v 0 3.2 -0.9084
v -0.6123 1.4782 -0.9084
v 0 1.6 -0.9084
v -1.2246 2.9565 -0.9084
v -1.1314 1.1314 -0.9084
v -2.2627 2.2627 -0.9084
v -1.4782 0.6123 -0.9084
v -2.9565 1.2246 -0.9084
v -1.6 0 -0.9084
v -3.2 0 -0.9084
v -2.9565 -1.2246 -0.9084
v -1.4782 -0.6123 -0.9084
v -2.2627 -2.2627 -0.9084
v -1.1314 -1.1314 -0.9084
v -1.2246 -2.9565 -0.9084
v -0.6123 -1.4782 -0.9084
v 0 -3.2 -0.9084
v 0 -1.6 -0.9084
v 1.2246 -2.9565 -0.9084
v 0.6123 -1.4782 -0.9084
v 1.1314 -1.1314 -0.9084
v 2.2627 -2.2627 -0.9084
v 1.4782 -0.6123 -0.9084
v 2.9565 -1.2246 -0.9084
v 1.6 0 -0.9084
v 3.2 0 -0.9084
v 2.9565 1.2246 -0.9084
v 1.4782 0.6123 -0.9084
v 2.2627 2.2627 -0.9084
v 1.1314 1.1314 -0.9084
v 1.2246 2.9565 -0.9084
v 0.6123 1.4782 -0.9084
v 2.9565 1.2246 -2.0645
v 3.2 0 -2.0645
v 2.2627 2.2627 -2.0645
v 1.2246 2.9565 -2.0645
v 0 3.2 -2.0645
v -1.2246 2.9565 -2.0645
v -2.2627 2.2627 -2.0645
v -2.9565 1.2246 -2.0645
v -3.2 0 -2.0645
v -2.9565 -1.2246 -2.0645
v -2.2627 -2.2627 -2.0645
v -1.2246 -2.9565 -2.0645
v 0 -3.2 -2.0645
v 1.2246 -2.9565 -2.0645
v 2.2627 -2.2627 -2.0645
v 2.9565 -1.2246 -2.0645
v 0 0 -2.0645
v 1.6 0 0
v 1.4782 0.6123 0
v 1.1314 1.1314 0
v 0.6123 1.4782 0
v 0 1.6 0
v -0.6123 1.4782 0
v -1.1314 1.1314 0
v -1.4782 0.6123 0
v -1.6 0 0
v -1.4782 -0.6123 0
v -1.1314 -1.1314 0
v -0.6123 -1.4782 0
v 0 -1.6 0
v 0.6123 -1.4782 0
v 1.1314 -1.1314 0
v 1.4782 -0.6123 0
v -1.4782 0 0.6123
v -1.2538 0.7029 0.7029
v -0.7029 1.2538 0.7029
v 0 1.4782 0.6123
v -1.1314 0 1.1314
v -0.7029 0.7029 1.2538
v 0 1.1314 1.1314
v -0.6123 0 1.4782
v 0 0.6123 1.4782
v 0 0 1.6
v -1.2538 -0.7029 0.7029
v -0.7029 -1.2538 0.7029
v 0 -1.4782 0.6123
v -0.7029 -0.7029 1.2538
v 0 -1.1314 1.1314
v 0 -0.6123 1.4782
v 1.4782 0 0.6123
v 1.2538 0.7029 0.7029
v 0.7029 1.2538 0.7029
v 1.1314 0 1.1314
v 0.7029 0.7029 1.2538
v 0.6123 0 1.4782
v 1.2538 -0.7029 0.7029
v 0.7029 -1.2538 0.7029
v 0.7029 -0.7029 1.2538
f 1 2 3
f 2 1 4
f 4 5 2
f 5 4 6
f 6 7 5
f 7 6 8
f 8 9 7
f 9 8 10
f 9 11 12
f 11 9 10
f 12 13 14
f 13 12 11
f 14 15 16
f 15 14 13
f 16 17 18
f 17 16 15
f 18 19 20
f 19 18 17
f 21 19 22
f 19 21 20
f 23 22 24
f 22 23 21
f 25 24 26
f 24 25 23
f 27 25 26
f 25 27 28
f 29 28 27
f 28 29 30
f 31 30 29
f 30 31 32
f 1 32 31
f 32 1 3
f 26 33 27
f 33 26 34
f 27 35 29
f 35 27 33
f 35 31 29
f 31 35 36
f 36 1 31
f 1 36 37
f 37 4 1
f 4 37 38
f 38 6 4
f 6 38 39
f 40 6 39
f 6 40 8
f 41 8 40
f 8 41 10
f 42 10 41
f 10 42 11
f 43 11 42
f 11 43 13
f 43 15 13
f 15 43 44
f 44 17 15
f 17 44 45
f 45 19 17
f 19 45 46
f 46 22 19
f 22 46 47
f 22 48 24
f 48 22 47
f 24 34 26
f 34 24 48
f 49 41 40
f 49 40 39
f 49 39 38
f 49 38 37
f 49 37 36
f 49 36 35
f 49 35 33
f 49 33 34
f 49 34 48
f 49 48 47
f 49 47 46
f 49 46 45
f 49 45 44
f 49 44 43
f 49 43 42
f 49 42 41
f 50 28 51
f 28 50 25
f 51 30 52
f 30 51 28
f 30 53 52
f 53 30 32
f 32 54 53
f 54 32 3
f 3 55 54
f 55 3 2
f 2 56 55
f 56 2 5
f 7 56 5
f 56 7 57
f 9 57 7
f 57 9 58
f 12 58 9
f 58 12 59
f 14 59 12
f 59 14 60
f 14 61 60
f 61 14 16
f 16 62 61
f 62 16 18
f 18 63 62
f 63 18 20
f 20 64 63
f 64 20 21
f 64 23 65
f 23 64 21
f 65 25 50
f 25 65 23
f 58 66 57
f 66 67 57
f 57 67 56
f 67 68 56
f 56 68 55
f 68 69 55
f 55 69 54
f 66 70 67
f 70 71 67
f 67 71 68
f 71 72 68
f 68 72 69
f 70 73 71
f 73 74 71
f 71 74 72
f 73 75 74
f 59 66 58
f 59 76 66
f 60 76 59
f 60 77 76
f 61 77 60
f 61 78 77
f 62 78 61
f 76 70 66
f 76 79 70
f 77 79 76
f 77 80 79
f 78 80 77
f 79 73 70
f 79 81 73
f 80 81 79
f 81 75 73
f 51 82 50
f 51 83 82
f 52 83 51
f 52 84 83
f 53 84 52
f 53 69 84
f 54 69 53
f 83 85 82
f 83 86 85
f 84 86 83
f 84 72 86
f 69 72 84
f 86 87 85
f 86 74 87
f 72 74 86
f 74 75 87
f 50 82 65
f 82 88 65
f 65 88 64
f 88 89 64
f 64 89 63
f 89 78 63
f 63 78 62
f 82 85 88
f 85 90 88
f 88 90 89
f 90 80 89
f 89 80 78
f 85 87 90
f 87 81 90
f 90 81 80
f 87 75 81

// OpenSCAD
// file: ../p/1-8sphe.scad
use <../lib.scad>
function ldraw_lib__1_8sphe() = [
// 0 Sphere 0.125
// 0 Name: 1-8sphe.dat
// 0 Author: James Jessiman
// 0 !LDRAW_ORG Primitive UPDATE 2012-03
// 0 !LICENSE Licensed under CC BY 4.0 : see CAreadme.txt
// 
// 0 BFC CERTIFY CCW
  [0,"BFC","CERTIFY"],
  [0,"BFC","CCW"],
// 
// 0 !HISTORY 2000-08-01 {Axel Poque} fixes to resolve L3P error messages.
// 0 !HISTORY 2000-08-01 {Manfred Moolhuysen} fixes to resolve L3P error messages.
// 0 !HISTORY 2000-09-30 [PTadmin] Official Update 2000-02
// 0 !HISTORY 2002-03-28 [hafhead] Made BFC compliant
// 0 !HISTORY 2002-04-25 [PTadmin] Official Update 2002-02
// 0 !HISTORY 2007-06-22 [PTadmin] Header formatted for Contributor Agreement
// 0 !HISTORY 2008-07-01 [PTadmin] Official Update 2008-01
// 0 !HISTORY 2010-09-12 [MagFors] Changed winding, removed duplicated cond-line, optimized filesize
// 0 !HISTORY 2010-12-31 [PTadmin] Official Update 2010-03
// 0 !HISTORY 2012-07-01 [tcobbs] Replaced with geometry from LDView
// 0 !HISTORY 2012-12-28 [PTadmin] Official Update 2012-03
// 
// 
// 3 16 1 0 0 0.9239 0.3827 0 0.9239 0 0.3827
  [3,16,1,0,0,0.9239,0.3827,0,0.9239,0,0.3827],
// 3 16 0.9239 0.3827 0 0.7836 0.4393 0.4393 0.9239 0 0.3827
  [3,16,0.9239,0.3827,0,0.7836,0.4393,0.4393,0.9239,0,0.3827],
// 3 16 0.9239 0 0.3827 0.7836 0.4393 0.4393 0.7071 0 0.7071
  [3,16,0.9239,0,0.3827,0.7836,0.4393,0.4393,0.7071,0,0.7071],
// 3 16 0.7836 0.4393 0.4393 0.4393 0.4393 0.7836 0.7071 0 0.7071
  [3,16,0.7836,0.4393,0.4393,0.4393,0.4393,0.7836,0.7071,0,0.7071],
// 3 16 0.7071 0 0.7071 0.4393 0.4393 0.7836 0.3827 0 0.9239
  [3,16,0.7071,0,0.7071,0.4393,0.4393,0.7836,0.3827,0,0.9239],
// 3 16 0.4393 0.4393 0.7836 0 0.3827 0.9239 0.3827 0 0.9239
  [3,16,0.4393,0.4393,0.7836,0,0.3827,0.9239,0.3827,0,0.9239],
// 3 16 0.3827 0 0.9239 0 0.3827 0.9239 0 0 1
  [3,16,0.3827,0,0.9239,0,0.3827,0.9239,0,0,1],
// 3 16 0.9239 0.3827 0 0.7071 0.7071 0 0.7836 0.4393 0.4393
  [3,16,0.9239,0.3827,0,0.7071,0.7071,0,0.7836,0.4393,0.4393],
// 3 16 0.7071 0.7071 0 0.4393 0.7836 0.4393 0.7836 0.4393 0.4393
  [3,16,0.7071,0.7071,0,0.4393,0.7836,0.4393,0.7836,0.4393,0.4393],
// 3 16 0.7836 0.4393 0.4393 0.4393 0.7836 0.4393 0.4393 0.4393 0.7836
  [3,16,0.7836,0.4393,0.4393,0.4393,0.7836,0.4393,0.4393,0.4393,0.7836],
// 3 16 0.4393 0.7836 0.4393 0 0.7071 0.7071 0.4393 0.4393 0.7836
  [3,16,0.4393,0.7836,0.4393,0,0.7071,0.7071,0.4393,0.4393,0.7836],
// 3 16 0.4393 0.4393 0.7836 0 0.7071 0.7071 0 0.3827 0.9239
  [3,16,0.4393,0.4393,0.7836,0,0.7071,0.7071,0,0.3827,0.9239],
// 3 16 0.7071 0.7071 0 0.3827 0.9239 0 0.4393 0.7836 0.4393
  [3,16,0.7071,0.7071,0,0.3827,0.9239,0,0.4393,0.7836,0.4393],
// 3 16 0.3827 0.9239 0 0 0.9239 0.3827 0.4393 0.7836 0.4393
  [3,16,0.3827,0.9239,0,0,0.9239,0.3827,0.4393,0.7836,0.4393],
// 3 16 0.4393 0.7836 0.4393 0 0.9239 0.3827 0 0.7071 0.7071
  [3,16,0.4393,0.7836,0.4393,0,0.9239,0.3827,0,0.7071,0.7071],
// 3 16 0.3827 0.9239 0 0 1 0 0 0.9239 0.3827
  [3,16,0.3827,0.9239,0,0,1,0,0,0.9239,0.3827],
// 
// 5 24 1 0 0 0.9239 0.3827 0 1 0 -0.1 0.9239 0 0.3827
  [5,24,1,0,0,0.9239,0.3827,0,1,0,-0.1,0.9239,0,0.3827],
// 5 24 0.9239 0.3827 0 0.9239 0 0.3827 1 0 0 0.7836 0.4393 0.4393
  [5,24,0.9239,0.3827,0,0.9239,0,0.3827,1,0,0,0.7836,0.4393,0.4393],
// 5 24 1 0 0 0.9239 0 0.3827 0.9239 0.3827 0 1 -0.1 0
  [5,24,1,0,0,0.9239,0,0.3827,0.9239,0.3827,0,1,-0.1,0],
// 5 24 0.9239 0 0.3827 0.7836 0.4393 0.4393 0.9239 0.3827 0 0.7071 0 0.7071
  [5,24,0.9239,0,0.3827,0.7836,0.4393,0.4393,0.9239,0.3827,0,0.7071,0,0.7071],
// 5 24 0.7836 0.4393 0.4393 0.7071 0 0.7071 0.9239 0 0.3827 0.4393 0.4393 0.7836
  [5,24,0.7836,0.4393,0.4393,0.7071,0,0.7071,0.9239,0,0.3827,0.4393,0.4393,0.7836],
// 5 24 0.9239 0 0.3827 0.7071 0 0.7071 0.7836 0.4393 0.4393 0.9239 -0.1 0.3827
  [5,24,0.9239,0,0.3827,0.7071,0,0.7071,0.7836,0.4393,0.4393,0.9239,-0.1,0.3827],
// 5 24 0.7071 0 0.7071 0.4393 0.4393 0.7836 0.7836 0.4393 0.4393 0.3827 0 0.9239
  [5,24,0.7071,0,0.7071,0.4393,0.4393,0.7836,0.7836,0.4393,0.4393,0.3827,0,0.9239],
// 5 24 0.4393 0.4393 0.7836 0.3827 0 0.9239 0.7071 0 0.7071 0 0.3827 0.9239
  [5,24,0.4393,0.4393,0.7836,0.3827,0,0.9239,0.7071,0,0.7071,0,0.3827,0.9239],
// 5 24 0.7071 0 0.7071 0.3827 0 0.9239 0.4393 0.4393 0.7836 0.7071 -0.1 0.7071
  [5,24,0.7071,0,0.7071,0.3827,0,0.9239,0.4393,0.4393,0.7836,0.7071,-0.1,0.7071],
// 5 24 0.3827 0 0.9239 0 0.3827 0.9239 0.4393 0.4393 0.7836 0 0 1
  [5,24,0.3827,0,0.9239,0,0.3827,0.9239,0.4393,0.4393,0.7836,0,0,1],
// 5 24 0 0.3827 0.9239 0 0 1 0.3827 0 0.9239 -0.1 0.3827 0.9239
  [5,24,0,0.3827,0.9239,0,0,1,0.3827,0,0.9239,-0.1,0.3827,0.9239],
// 5 24 0.3827 0 0.9239 0 0 1 0 0.3827 0.9239 0.3827 -0.1 0.9239
  [5,24,0.3827,0,0.9239,0,0,1,0,0.3827,0.9239,0.3827,-0.1,0.9239],
// 5 24 0.9239 0.3827 0 0.7071 0.7071 0 0.9239 0.3827 -0.1 0.7836 0.4393 0.4393
  [5,24,0.9239,0.3827,0,0.7071,0.7071,0,0.9239,0.3827,-0.1,0.7836,0.4393,0.4393],
// 5 24 0.7071 0.7071 0 0.7836 0.4393 0.4393 0.9239 0.3827 0 0.4393 0.7836 0.4393
  [5,24,0.7071,0.7071,0,0.7836,0.4393,0.4393,0.9239,0.3827,0,0.4393,0.7836,0.4393],
// 5 24 0.9239 0.3827 0 0.7836 0.4393 0.4393 0.7071 0.7071 0 0.9239 0 0.3827
  [5,24,0.9239,0.3827,0,0.7836,0.4393,0.4393,0.7071,0.7071,0,0.9239,0,0.3827],
// 5 24 0.7836 0.4393 0.4393 0.4393 0.7836 0.4393 0.7071 0.7071 0 0.4393 0.4393 0.7836
  [5,24,0.7836,0.4393,0.4393,0.4393,0.7836,0.4393,0.7071,0.7071,0,0.4393,0.4393,0.7836],
// 5 24 0.4393 0.7836 0.4393 0.4393 0.4393 0.7836 0.7836 0.4393 0.4393 0 0.7071 0.7071
  [5,24,0.4393,0.7836,0.4393,0.4393,0.4393,0.7836,0.7836,0.4393,0.4393,0,0.7071,0.7071],
// 5 24 0.7836 0.4393 0.4393 0.4393 0.4393 0.7836 0.4393 0.7836 0.4393 0.7071 0 0.7071
  [5,24,0.7836,0.4393,0.4393,0.4393,0.4393,0.7836,0.4393,0.7836,0.4393,0.7071,0,0.7071],
// 5 24 0.4393 0.4393 0.7836 0 0.7071 0.7071 0.4393 0.7836 0.4393 0 0.3827 0.9239
  [5,24,0.4393,0.4393,0.7836,0,0.7071,0.7071,0.4393,0.7836,0.4393,0,0.3827,0.9239],
// 5 24 0 0.7071 0.7071 0 0.3827 0.9239 0.4393 0.4393 0.7836 -0.1 0.7071 0.7071
  [5,24,0,0.7071,0.7071,0,0.3827,0.9239,0.4393,0.4393,0.7836,-0.1,0.7071,0.7071],
// 5 24 0.4393 0.4393 0.7836 0 0.3827 0.9239 0 0.7071 0.7071 0.3827 0 0.9239
  [5,24,0.4393,0.4393,0.7836,0,0.3827,0.9239,0,0.7071,0.7071,0.3827,0,0.9239],
// 5 24 0.7071 0.7071 0 0.3827 0.9239 0 0.7071 0.7071 -0.1 0.4393 0.7836 0.4393
  [5,24,0.7071,0.7071,0,0.3827,0.9239,0,0.7071,0.7071,-0.1,0.4393,0.7836,0.4393],
// 5 24 0.3827 0.9239 0 0.4393 0.7836 0.4393 0.7071 0.7071 0 0 0.9239 0.3827
  [5,24,0.3827,0.9239,0,0.4393,0.7836,0.4393,0.7071,0.7071,0,0,0.9239,0.3827],
// 5 24 0.7071 0.7071 0 0.4393 0.7836 0.4393 0.3827 0.9239 0 0.7836 0.4393 0.4393
  [5,24,0.7071,0.7071,0,0.4393,0.7836,0.4393,0.3827,0.9239,0,0.7836,0.4393,0.4393],
// 5 24 0.4393 0.7836 0.4393 0 0.9239 0.3827 0.3827 0.9239 0 0 0.7071 0.7071
  [5,24,0.4393,0.7836,0.4393,0,0.9239,0.3827,0.3827,0.9239,0,0,0.7071,0.7071],
// 5 24 0 0.9239 0.3827 0 0.7071 0.7071 0.4393 0.7836 0.4393 -0.1 0.9239 0.3827
  [5,24,0,0.9239,0.3827,0,0.7071,0.7071,0.4393,0.7836,0.4393,-0.1,0.9239,0.3827],
// 5 24 0.4393 0.7836 0.4393 0 0.7071 0.7071 0 0.9239 0.3827 0.4393 0.4393 0.7836
  [5,24,0.4393,0.7836,0.4393,0,0.7071,0.7071,0,0.9239,0.3827,0.4393,0.4393,0.7836],
// 5 24 0.3827 0.9239 0 0 1 0 0.3827 0.9239 -0.1 0 0.9239 0.3827
  [5,24,0.3827,0.9239,0,0,1,0,0.3827,0.9239,-0.1,0,0.9239,0.3827],
// 5 24 0 1 0 0 0.9239 0.3827 0.3827 0.9239 0 -0.1 1 0
  [5,24,0,1,0,0,0.9239,0.3827,0.3827,0.9239,0,-0.1,1,0],
// 5 24 0.3827 0.9239 0 0 0.9239 0.3827 0 1 0 0.4393 0.7836 0.4393
  [5,24,0.3827,0.9239,0,0,0.9239,0.3827,0,1,0,0.4393,0.7836,0.4393],
];
module ldraw_lib__1_8sphe(step=0, col=false, unit=2/5, alt=false, line=0.2, solid=!$preview)
    makepoly(ldraw_lib__1_8sphe(), step=step, col=col, unit=unit, alt=alt, line=line, solid=solid);
ldraw_lib__1_8sphe(line=0.2);
// file: ../p/4-8sphe.scad
use <../lib.scad>
use <1-8sphe.scad>
function ldraw_lib__4_8sphe() = [
// 0 Sphere 0.5
// 0 Name: 4-8sphe.dat
// 0 Author: James Jessiman
// 0 !LDRAW_ORG Primitive UPDATE 2003-02
// 0 !LICENSE Licensed under CC BY 4.0 : see CAreadme.txt
// 
// 0 BFC CERTIFY CCW
  [0,"BFC","CERTIFY"],
  [0,"BFC","CCW"],
// 
// 0 !HISTORY 2002-08-31 [izanette] Modified with WINDZ for BFC compliance
// 0 !HISTORY 2003-08-01 [PTadmin] Official Update 2003-02
// 0 !HISTORY 2007-06-24 [PTadmin] Header formatted for Contributor Agreement
// 0 !HISTORY 2008-07-01 [PTadmin] Official Update 2008-01
// 
// 
// 1 16 0 0 0 1 0 0 0 1 0 0 0 1 1-8sphe.dat
  [1,16,0,0,0,1,0,0,0,1,0,0,0,1, ldraw_lib__1_8sphe()],
// 1 16 0 0 0 1 0 0 0 1 0 0 0 -1 1-8sphe.dat
  [1,16,0,0,0,1,0,0,0,1,0,0,0,-1, ldraw_lib__1_8sphe()],
// 1 16 0 0 0 -1 0 0 0 1 0 0 0 1 1-8sphe.dat
  [1,16,0,0,0,-1,0,0,0,1,0,0,0,1, ldraw_lib__1_8sphe()],
// 1 16 0 0 0 -1 0 0 0 1 0 0 0 -1 1-8sphe.dat
  [1,16,0,0,0,-1,0,0,0,1,0,0,0,-1, ldraw_lib__1_8sphe()],
// 0
// 
];
module ldraw_lib__4_8sphe(step=0, col=false, unit=2/5, alt=false, line=0.2, solid=!$preview)
    makepoly(ldraw_lib__4_8sphe(), step=step, col=col, unit=unit, alt=alt, line=line, solid=solid);
ldraw_lib__4_8sphe(line=0.2);
// file: ../p/4-4ring1.scad
use <../lib.scad>
function ldraw_lib__4_4ring1() = [
// 0 Ring  1 x 1.0
// 0 Name: 4-4ring1.dat
// 0 Author: James Jessiman
// 0 !LDRAW_ORG Primitive UPDATE 2009-01
// 0 !LICENSE Licensed under CC BY 4.0 : see CAreadme.txt
// 
// 0 BFC CERTIFY CCW
  [0,"BFC","CERTIFY"],
  [0,"BFC","CCW"],
// 
// 0 !HISTORY 1998-12-15 [PTadmin] Official Update 1998-10
// 0 !HISTORY 2002-04-08 [BrickCaster] Modified for BFC compliance
// 0 !HISTORY 2002-04-25 [PTadmin] Official Update 2002-02
// 0 !HISTORY 2007-06-24 [PTadmin] Header formatted for Contributor Agreement
// 0 !HISTORY 2008-07-01 [PTadmin] Official Update 2008-01
// 0 !HISTORY 2008-08-26 [cwdee] Switch polygon winding and rename
// 0 !HISTORY 2009-05-02 [PTadmin] Official Update 2009-01
// 
// 
// 4 16 -0.7654 0 1.8478 -0.3827 0 0.9239 0 0 1 0 0 2
  [4,16,-0.7654,0,1.8478,-0.3827,0,0.9239,0,0,1,0,0,2],
// 4 16 -1.4142 0 1.4142 -0.7071 0 0.7071 -0.3827 0 0.9239 -0.7654 0 1.8478
  [4,16,-1.4142,0,1.4142,-0.7071,0,0.7071,-0.3827,0,0.9239,-0.7654,0,1.8478],
// 4 16 -1.8478 0 0.7654 -0.9239 0 0.3827 -0.7071 0 0.7071 -1.4142 0 1.41420
  [4,16,-1.8478,0,0.7654,-0.9239,0,0.3827,-0.7071,0,0.7071,-1.4142,0,1.41420],
// 4 16 -2 0 0 -1 0 0 -0.9239 0 0.3827 -1.8478 0 0.7654
  [4,16,-2,0,0,-1,0,0,-0.9239,0,0.3827,-1.8478,0,0.7654],
// 4 16 -1.8478 0 -0.7654 -0.9239 0 -0.3827 -1 0 0 -2 0 0
  [4,16,-1.8478,0,-0.7654,-0.9239,0,-0.3827,-1,0,0,-2,0,0],
// 4 16 -1.4142 0 -1.4142 -0.7071 0 -0.7071 -0.9239 0 -0.3827 -1.8478 0 -0.7654
  [4,16,-1.4142,0,-1.4142,-0.7071,0,-0.7071,-0.9239,0,-0.3827,-1.8478,0,-0.7654],
// 4 16 -0.7654 0 -1.8478 -0.3827 0 -0.9239 -0.7071 0 -0.7071 -1.4142 0 -1.4142
  [4,16,-0.7654,0,-1.8478,-0.3827,0,-0.9239,-0.7071,0,-0.7071,-1.4142,0,-1.4142],
// 4 16 0 0 -2 0 0 -1 -0.3827 0 -0.9239 -0.7654 0 -1.8478
  [4,16,0,0,-2,0,0,-1,-0.3827,0,-0.9239,-0.7654,0,-1.8478],
// 4 16 0.7654 0 -1.8478 0.3827 0 -0.9239 0 0 -1 0 0 -2
  [4,16,0.7654,0,-1.8478,0.3827,0,-0.9239,0,0,-1,0,0,-2],
// 4 16 1.4142 0 -1.4142 0.7071 0 -0.7071 0.3827 0 -0.9239 0.7654 0 -1.8478
  [4,16,1.4142,0,-1.4142,0.7071,0,-0.7071,0.3827,0,-0.9239,0.7654,0,-1.8478],
// 4 16 1.8478 0 -0.7654 0.9239 0 -0.3827 0.7071 0 -0.7071 1.4142 0 -1.4142
  [4,16,1.8478,0,-0.7654,0.9239,0,-0.3827,0.7071,0,-0.7071,1.4142,0,-1.4142],
// 4 16 2 0 0 1 0 0 0.9239 0 -0.3827 1.8478 0 -0.7654
  [4,16,2,0,0,1,0,0,0.9239,0,-0.3827,1.8478,0,-0.7654],
// 4 16 1.8478 0 0.7654 0.9239 0 0.3827 1 0 0 2 0 0
  [4,16,1.8478,0,0.7654,0.9239,0,0.3827,1,0,0,2,0,0],
// 4 16 1.4142 0 1.4142 0.7071 0 0.7071 0.9239 0 0.3827 1.8478 0 0.7654
  [4,16,1.4142,0,1.4142,0.7071,0,0.7071,0.9239,0,0.3827,1.8478,0,0.7654],
// 4 16 0.7654 0 1.8478 0.3827 0 0.9239 0.7071 0 0.7071 1.4142 0 1.4142
  [4,16,0.7654,0,1.8478,0.3827,0,0.9239,0.7071,0,0.7071,1.4142,0,1.4142],
// 4 16 0 0 2 0 0 1 0.3827 0 0.9239 0.7654 0 1.8478
  [4,16,0,0,2,0,0,1,0.3827,0,0.9239,0.7654,0,1.8478],
// 0
];
module ldraw_lib__4_4ring1(step=0, col=false, unit=2/5, alt=false, line=0.2, solid=!$preview)
    makepoly(ldraw_lib__4_4ring1(), step=step, col=col, unit=unit, alt=alt, line=line, solid=solid);
ldraw_lib__4_4ring1(line=0.2);
// file: ../p/4-4edge.scad
use <../lib.scad>
function ldraw_lib__4_4edge() = [
// 0 Circle 1.0
// 0 Name: 4-4edge.dat
// 0 Author: James Jessiman
// 0 !LDRAW_ORG Primitive UPDATE 2017-01
// 0 !LICENSE Licensed under CC BY 4.0 : see CAreadme.txt
// 
// 0 BFC CERTIFY CCW
  [0,"BFC","CERTIFY"],
  [0,"BFC","CCW"],
// 
// 0 !HISTORY 1998-12-15 [PTadmin] Official Update 1998-10
// 0 !HISTORY 2005-12-28 [PTadmin] Official Update 2005-01
// 0 !HISTORY 2007-06-24 [PTadmin] Header formatted for Contributor Agreement
// 0 !HISTORY 2008-07-01 [PTadmin] Official Update 2008-01
// 0 !HISTORY 2017-01-15 [Steffen] BFCed
// 0 !HISTORY 2017-12-30 [PTadmin] Official Update 2017-01
// 
// 
// 2 24 1 0 0 0.9239 0 0.3827
  [2,24,1,0,0,0.9239,0,0.3827],
// 2 24 0.9239 0 0.3827 0.7071 0 0.7071
  [2,24,0.9239,0,0.3827,0.7071,0,0.7071],
// 2 24 0.7071 0 0.7071 0.3827 0 0.9239
  [2,24,0.7071,0,0.7071,0.3827,0,0.9239],
// 2 24 0.3827 0 0.9239 0 0 1
  [2,24,0.3827,0,0.9239,0,0,1],
// 2 24 0 0 1 -0.3827 0 0.9239
  [2,24,0,0,1,-0.3827,0,0.9239],
// 2 24 -0.3827 0 0.9239 -0.7071 0 0.7071
  [2,24,-0.3827,0,0.9239,-0.7071,0,0.7071],
// 2 24 -0.7071 0 0.7071 -0.9239 0 0.3827
  [2,24,-0.7071,0,0.7071,-0.9239,0,0.3827],
// 2 24 -0.9239 0 0.3827 -1 0 -0
  [2,24,-0.9239,0,0.3827,-1,0,-0],
// 2 24 -1 0 -0 -0.9239 0 -0.3827
  [2,24,-1,0,-0,-0.9239,0,-0.3827],
// 2 24 -0.9239 0 -0.3827 -0.7071 0 -0.7071
  [2,24,-0.9239,0,-0.3827,-0.7071,0,-0.7071],
// 2 24 -0.7071 0 -0.7071 -0.3827 0 -0.9239
  [2,24,-0.7071,0,-0.7071,-0.3827,0,-0.9239],
// 2 24 -0.3827 0 -0.9239 0 0 -1
  [2,24,-0.3827,0,-0.9239,0,0,-1],
// 2 24 0 0 -1 0.3827 0 -0.9239
  [2,24,0,0,-1,0.3827,0,-0.9239],
// 2 24 0.3827 0 -0.9239 0.7071 0 -0.7071
  [2,24,0.3827,0,-0.9239,0.7071,0,-0.7071],
// 2 24 0.7071 0 -0.7071 0.9239 0 -0.3827
  [2,24,0.7071,0,-0.7071,0.9239,0,-0.3827],
// 2 24 0.9239 0 -0.3827 1 0 0
  [2,24,0.9239,0,-0.3827,1,0,0],
];
module ldraw_lib__4_4edge(step=0, col=false, unit=2/5, alt=false, line=0.2, solid=!$preview)
    makepoly(ldraw_lib__4_4edge(), step=step, col=col, unit=unit, alt=alt, line=line, solid=solid);
ldraw_lib__4_4edge(line=0.2);
// file: ../p/4-4disc.scad
use <../lib.scad>
function ldraw_lib__4_4disc() = [
// 0 Disc 1.0
// 0 Name: 4-4disc.dat
// 0 Author: James Jessiman
// 0 !LDRAW_ORG Primitive UPDATE 2002-02
// 0 !LICENSE Licensed under CC BY 4.0 : see CAreadme.txt
// 
// 0 BFC CERTIFY CCW
  [0,"BFC","CERTIFY"],
  [0,"BFC","CCW"],
// 
// 0 !HISTORY 1998-12-15 [PTadmin] Official Update 1998-10
// 0 !HISTORY 2002-03-23 [sbliss] Added BFC statement
// 0 !HISTORY 2002-04-25 [PTadmin] Official Update 2002-02
// 0 !HISTORY 2007-06-24 [PTadmin] Header formatted for Contributor Agreement
// 0 !HISTORY 2008-07-01 [PTadmin] Official Update 2008-01
// 
// 
// 3 16 0 0 0 1 0 0 0.9239 0 0.3827
  [3,16,0,0,0,1,0,0,0.9239,0,0.3827],
// 3 16 0 0 0 0.9239 0 0.3827 0.7071 0 0.7071
  [3,16,0,0,0,0.9239,0,0.3827,0.7071,0,0.7071],
// 3 16 0 0 0 0.7071 0 0.7071 0.3827 0 0.9239
  [3,16,0,0,0,0.7071,0,0.7071,0.3827,0,0.9239],
// 3 16 0 0 0 0.3827 0 0.9239 0 0 1
  [3,16,0,0,0,0.3827,0,0.9239,0,0,1],
// 3 16 0 0 0 0 0 1 -0.3827 0 0.9239
  [3,16,0,0,0,0,0,1,-0.3827,0,0.9239],
// 3 16 0 0 0 -0.3827 0 0.9239 -0.7071 0 0.7071
  [3,16,0,0,0,-0.3827,0,0.9239,-0.7071,0,0.7071],
// 3 16 0 0 0 -0.7071 0 0.7071 -0.9239 0 0.3827
  [3,16,0,0,0,-0.7071,0,0.7071,-0.9239,0,0.3827],
// 3 16 0 0 0 -0.9239 0 0.3827 -1 0 -0
  [3,16,0,0,0,-0.9239,0,0.3827,-1,0,-0],
// 3 16 0 0 0 -1 0 -0 -0.9239 0 -0.3827
  [3,16,0,0,0,-1,0,-0,-0.9239,0,-0.3827],
// 3 16 0 0 0 -0.9239 0 -0.3827 -0.7071 0 -0.7071
  [3,16,0,0,0,-0.9239,0,-0.3827,-0.7071,0,-0.7071],
// 3 16 0 0 0 -0.7071 0 -0.7071 -0.3827 0 -0.9239
  [3,16,0,0,0,-0.7071,0,-0.7071,-0.3827,0,-0.9239],
// 3 16 0 0 0 -0.3827 0 -0.9239 0 0 -1
  [3,16,0,0,0,-0.3827,0,-0.9239,0,0,-1],
// 3 16 0 0 0 0 0 -1 0.3827 0 -0.9239
  [3,16,0,0,0,0,0,-1,0.3827,0,-0.9239],
// 3 16 0 0 0 0.3827 0 -0.9239 0.7071 0 -0.7071
  [3,16,0,0,0,0.3827,0,-0.9239,0.7071,0,-0.7071],
// 3 16 0 0 0 0.7071 0 -0.7071 0.9239 0 -0.3827
  [3,16,0,0,0,0.7071,0,-0.7071,0.9239,0,-0.3827],
// 3 16 0 0 0 0.9239 0 -0.3827 1 0 0
  [3,16,0,0,0,0.9239,0,-0.3827,1,0,0],
// 0
];
module ldraw_lib__4_4disc(step=0, col=false, unit=2/5, alt=false, line=0.2, solid=!$preview)
    makepoly(ldraw_lib__4_4disc(), step=step, col=col, unit=unit, alt=alt, line=line, solid=solid);
ldraw_lib__4_4disc(line=0.2);
// file: ../p/4-4cylo.scad
use <../lib.scad>
use <4-4cyli.scad>
use <4-4edge.scad>
function ldraw_lib__4_4cylo() = [
// 0 Cylinder Open 1.0
// 0 Name: 4-4cylo.dat
// 0 Author: Mark Kennedy [mkennedy]
// 0 !LDRAW_ORG Primitive UPDATE 2010-01
// 0 !LICENSE Licensed under CC BY 4.0 : see CAreadme.txt
// 
// 0 BFC CERTIFY CCW
  [0,"BFC","CERTIFY"],
  [0,"BFC","CCW"],
// 
// 0 !HISTORY 2010-04-05 [PTadmin] Official Update 2010-01
// 
// 
// 1 16 0 0 0 1 0 0 0 1 0 0 0 1 4-4edge.dat
  [1,16,0,0,0,1,0,0,0,1,0,0,0,1, ldraw_lib__4_4edge()],
// 1 16 0 1 0 1 0 0 0 1 0 0 0 1 4-4edge.dat
  [1,16,0,1,0,1,0,0,0,1,0,0,0,1, ldraw_lib__4_4edge()],
// 1 16 0 0 0 1 0 0 0 1 0 0 0 1 4-4cyli.dat
  [1,16,0,0,0,1,0,0,0,1,0,0,0,1, ldraw_lib__4_4cyli()],
// 0
];
module ldraw_lib__4_4cylo(step=0, col=false, unit=2/5, alt=false, line=0.2, solid=!$preview)
    makepoly(ldraw_lib__4_4cylo(), step=step, col=col, unit=unit, alt=alt, line=line, solid=solid);
ldraw_lib__4_4cylo(line=0.2);
// file: ../p/4-4cyli.scad
use <../lib.scad>
function ldraw_lib__4_4cyli() = [
// 0 Cylinder 1.0
// 0 Name: 4-4cyli.dat
// 0 Author: James Jessiman
// 0 !LDRAW_ORG Primitive UPDATE 2005-01
// 0 !LICENSE Licensed under CC BY 4.0 : see CAreadme.txt
// 
// 0 BFC CERTIFY CCW
  [0,"BFC","CERTIFY"],
  [0,"BFC","CCW"],
// 
// 0 !HISTORY 1998-12-15 [PTadmin] Official Update 1998-10
// 0 !HISTORY 2002-03-23 [sbliss] Added BFC statement; merged headers from files in distributions LDraw 0.27 and Complete.
// 0 !HISTORY 2002-04-25 [PTadmin] Official Update 2002-02
// 0 !HISTORY 2004-12-14 [guyvivan] BFC CCW
// 0 !HISTORY 2005-12-28 [PTadmin] Official Update 2005-01
// 0 !HISTORY 2007-06-24 [PTadmin] Header formatted for Contributor Agreement
// 0 !HISTORY 2008-07-01 [PTadmin] Official Update 2008-01
// 
// 
// 4 16 1 1 0 0.9239 1 0.3827 0.9239 0 0.3827 1 0 0
  [4,16,1,1,0,0.9239,1,0.3827,0.9239,0,0.3827,1,0,0],
// 5 24 1 0 0 1 1 0 0.9239 0 0.3827 0.9239 0 -0.3827
  [5,24,1,0,0,1,1,0,0.9239,0,0.3827,0.9239,0,-0.3827],
// 4 16 0.9239 1 0.3827 0.7071 1 0.7071 0.7071 0 0.7071 0.9239 0 0.3827
  [4,16,0.9239,1,0.3827,0.7071,1,0.7071,0.7071,0,0.7071,0.9239,0,0.3827],
// 5 24 0.9239 0 0.3827 0.9239 1 0.3827 0.7071 0 0.7071 1 0 0
  [5,24,0.9239,0,0.3827,0.9239,1,0.3827,0.7071,0,0.7071,1,0,0],
// 4 16 0.7071 1 0.7071 0.3827 1 0.9239 0.3827 0 0.9239 0.7071 0 0.7071
  [4,16,0.7071,1,0.7071,0.3827,1,0.9239,0.3827,0,0.9239,0.7071,0,0.7071],
// 5 24 0.7071 0 0.7071 0.7071 1 0.7071 0.3827 0 0.9239 0.9239 0 0.3827
  [5,24,0.7071,0,0.7071,0.7071,1,0.7071,0.3827,0,0.9239,0.9239,0,0.3827],
// 4 16 0.3827 1 0.9239 0 1 1 0 0 1 0.3827 0 0.9239
  [4,16,0.3827,1,0.9239,0,1,1,0,0,1,0.3827,0,0.9239],
// 5 24 0.3827 0 0.9239 0.3827 1 0.9239 0 0 1 0.7071 0 0.7071
  [5,24,0.3827,0,0.9239,0.3827,1,0.9239,0,0,1,0.7071,0,0.7071],
// 4 16 0 1 1 -0.3827 1 0.9239 -0.3827 0 0.9239 0 0 1
  [4,16,0,1,1,-0.3827,1,0.9239,-0.3827,0,0.9239,0,0,1],
// 5 24 0 0 1 0 1 1 -0.3827 0 0.9239 0.3827 0 0.9239
  [5,24,0,0,1,0,1,1,-0.3827,0,0.9239,0.3827,0,0.9239],
// 4 16 -0.3827 1 0.9239 -0.7071 1 0.7071 -0.7071 0 0.7071 -0.3827 0 0.9239
  [4,16,-0.3827,1,0.9239,-0.7071,1,0.7071,-0.7071,0,0.7071,-0.3827,0,0.9239],
// 5 24 -0.3827 0 0.9239 -0.3827 1 0.9239 -0.7071 0 0.7071 0 0 1
  [5,24,-0.3827,0,0.9239,-0.3827,1,0.9239,-0.7071,0,0.7071,0,0,1],
// 4 16 -0.7071 1 0.7071 -0.9239 1 0.3827 -0.9239 0 0.3827 -0.7071 0 0.7071
  [4,16,-0.7071,1,0.7071,-0.9239,1,0.3827,-0.9239,0,0.3827,-0.7071,0,0.7071],
// 5 24 -0.7071 0 0.7071 -0.7071 1 0.7071 -0.9239 0 0.3827 -0.3827 0 0.9239
  [5,24,-0.7071,0,0.7071,-0.7071,1,0.7071,-0.9239,0,0.3827,-0.3827,0,0.9239],
// 4 16 -0.9239 1 0.3827 -1 1 0 -1 0 0 -0.9239 0 0.3827
  [4,16,-0.9239,1,0.3827,-1,1,0,-1,0,0,-0.9239,0,0.3827],
// 5 24 -0.9239 0 0.3827 -0.9239 1 0.3827 -1 0 0 -0.7071 0 0.7071
  [5,24,-0.9239,0,0.3827,-0.9239,1,0.3827,-1,0,0,-0.7071,0,0.7071],
// 4 16 -1 1 0 -0.9239 1 -0.3827 -0.9239 0 -0.3827 -1 0 0
  [4,16,-1,1,0,-0.9239,1,-0.3827,-0.9239,0,-0.3827,-1,0,0],
// 5 24 -1 0 0 -1 1 0 -0.9239 0 -0.3827 -0.9239 0 0.3827
  [5,24,-1,0,0,-1,1,0,-0.9239,0,-0.3827,-0.9239,0,0.3827],
// 4 16 -0.9239 1 -0.3827 -0.7071 1 -0.7071 -0.7071 0 -0.7071 -0.9239 0 -0.3827
  [4,16,-0.9239,1,-0.3827,-0.7071,1,-0.7071,-0.7071,0,-0.7071,-0.9239,0,-0.3827],
// 5 24 -0.9239 0 -0.3827 -0.9239 1 -0.3827 -0.7071 0 -0.7071 -1 0 0
  [5,24,-0.9239,0,-0.3827,-0.9239,1,-0.3827,-0.7071,0,-0.7071,-1,0,0],
// 4 16 -0.7071 1 -0.7071 -0.3827 1 -0.9239 -0.3827 0 -0.9239 -0.7071 0 -0.7071
  [4,16,-0.7071,1,-0.7071,-0.3827,1,-0.9239,-0.3827,0,-0.9239,-0.7071,0,-0.7071],
// 5 24 -0.7071 0 -0.7071 -0.7071 1 -0.7071 -0.3827 0 -0.9239 -0.9239 0 -0.3827
  [5,24,-0.7071,0,-0.7071,-0.7071,1,-0.7071,-0.3827,0,-0.9239,-0.9239,0,-0.3827],
// 4 16 -0.3827 1 -0.9239 0 1 -1 0 0 -1 -0.3827 0 -0.9239
  [4,16,-0.3827,1,-0.9239,0,1,-1,0,0,-1,-0.3827,0,-0.9239],
// 5 24 -0.3827 0 -0.9239 -0.3827 1 -0.9239 0 0 -1 -0.7071 0 -0.7071
  [5,24,-0.3827,0,-0.9239,-0.3827,1,-0.9239,0,0,-1,-0.7071,0,-0.7071],
// 4 16 0 1 -1 0.3827 1 -0.9239 0.3827 0 -0.9239 0 0 -1
  [4,16,0,1,-1,0.3827,1,-0.9239,0.3827,0,-0.9239,0,0,-1],
// 5 24 0 0 -1 0 1 -1 0.3827 0 -0.9239 -0.3827 0 -0.9239
  [5,24,0,0,-1,0,1,-1,0.3827,0,-0.9239,-0.3827,0,-0.9239],
// 4 16 0.3827 1 -0.9239 0.7071 1 -0.7071 0.7071 0 -0.7071 0.3827 0 -0.9239
  [4,16,0.3827,1,-0.9239,0.7071,1,-0.7071,0.7071,0,-0.7071,0.3827,0,-0.9239],
// 5 24 0.3827 0 -0.9239 0.3827 1 -0.9239 0.7071 0 -0.7071 0 0 -1
  [5,24,0.3827,0,-0.9239,0.3827,1,-0.9239,0.7071,0,-0.7071,0,0,-1],
// 4 16 0.7071 1 -0.7071 0.9239 1 -0.3827 0.9239 0 -0.3827 0.7071 0 -0.7071
  [4,16,0.7071,1,-0.7071,0.9239,1,-0.3827,0.9239,0,-0.3827,0.7071,0,-0.7071],
// 5 24 0.7071 0 -0.7071 0.7071 1 -0.7071 0.9239 0 -0.3827 0.3827 0 -0.9239
  [5,24,0.7071,0,-0.7071,0.7071,1,-0.7071,0.9239,0,-0.3827,0.3827,0,-0.9239],
// 4 16 0.9239 1 -0.3827 1 1 0 1 0 0 0.9239 0 -0.3827
  [4,16,0.9239,1,-0.3827,1,1,0,1,0,0,0.9239,0,-0.3827],
// 5 24 0.9239 0 -0.3827 0.9239 1 -0.3827 1 0 0 0.7071 0 -0.7071
  [5,24,0.9239,0,-0.3827,0.9239,1,-0.3827,1,0,0,0.7071,0,-0.7071],
// 0
];
module ldraw_lib__4_4cyli(step=0, col=false, unit=2/5, alt=false, line=0.2, solid=!$preview)
    makepoly(ldraw_lib__4_4cyli(), step=step, col=col, unit=unit, alt=alt, line=line, solid=solid);
ldraw_lib__4_4cyli(line=0.2);
// main file
use <../lib.scad>
use <../p/4-4cyli.scad>
use <../p/4-4cylo.scad>
use <../p/4-4disc.scad>
use <../p/4-4edge.scad>
use <../p/4-4ring1.scad>
use <../p/4-8sphe.scad>
function ldraw_lib__30527k02() = [
// 0 ~Hose Flexible 12L Segment
// 0 Name: 30527k02.dat
// 0 Author: Steve Bliss [sbliss]
// 0 !LDRAW_ORG Part Flexible_Section UPDATE 2025-09
// 0 !LICENSE Licensed under CC BY 4.0 : see CAreadme.txt
// 
// 0 !HELP This file is one segment of the rubber 'hose'. The segment is
// 0 !HELP positioned with the center on the spherical 'cap', for smoother
// 0 !HELP flexing of hose.
// 
// 0 BFC CERTIFY CCW
  [0,"BFC","CERTIFY"],
  [0,"BFC","CCW"],
// 
// 0 !HISTORY 2004-03-02 [PTadmin] Official Update 2004-01
// 0 !HISTORY 2007-12-30 [PTadmin] Header formatted for Contributor Agreement
// 0 !HISTORY 2008-07-01 [PTadmin] Official Update 2008-01
// 0 !HISTORY 2018-04-02 [PTadmin] Renamed from 758
// 0 !HISTORY 2018-04-24 [MMR1988] Used cylo primitive, Updated ring primitive
// 0 !HISTORY 2020-12-29 [PTadmin] Official Update 2020-03
// 0 !HISTORY 2025-09-27 [OrionP] Changed winding to CCW
// 0 !HISTORY 2025-09-29 [OrionP] Official Update 2025-09
// 
// 1 16 0 2.2710 0 4 0 0 0 1 0 0 0 4 4-4edge.dat
  [1,16,0,2.2710,0,4,0,0,0,1,0,0,0,4, ldraw_lib__4_4edge()],
// 1 16 0 5.1613 0 -4 0 0 0 -1 0 0 0 4 4-4edge.dat
  [1,16,0,5.1613,0,-4,0,0,0,-1,0,0,0,4, ldraw_lib__4_4edge()],
// 
// 1 16 0 2.2710 0 4 0 0 0 1 0 0 0 4 4-4ring1.dat
  [1,16,0,2.2710,0,4,0,0,0,1,0,0,0,4, ldraw_lib__4_4ring1()],
// 1 16 0 2.2710 0 8 0 0 0 2.8903 0 0 0 8 4-4cylo.dat
  [1,16,0,2.2710,0,8,0,0,0,2.8903,0,0,0,8, ldraw_lib__4_4cylo()],
// 1 16 0 5.1613 0 -8 0 0 0 -1 0 0 0 8 4-4disc.dat
  [1,16,0,5.1613,0,-8,0,0,0,-1,0,0,0,8, ldraw_lib__4_4disc()],
// 
// 1 16 0 0 0 4 0 0 0 2.2710 0 0 0 4 4-4cyli.dat
  [1,16,0,0,0,4,0,0,0,2.2710,0,0,0,4, ldraw_lib__4_4cyli()],
// 1 16 0 0 0 -4 0 0 0 -4 0 0 0 4 4-8sphe.dat
  [1,16,0,0,0,-4,0,0,0,-4,0,0,0,4, ldraw_lib__4_8sphe()],
];
module ldraw_lib__30527k02(step=0, col=false, unit=2/5, alt=false, line=0.2, solid=!$preview)
    makepoly(ldraw_lib__30527k02(), step=step, col=col, unit=unit, alt=alt, line=line, solid=solid);
ldraw_lib__30527k02(line=0.2);
